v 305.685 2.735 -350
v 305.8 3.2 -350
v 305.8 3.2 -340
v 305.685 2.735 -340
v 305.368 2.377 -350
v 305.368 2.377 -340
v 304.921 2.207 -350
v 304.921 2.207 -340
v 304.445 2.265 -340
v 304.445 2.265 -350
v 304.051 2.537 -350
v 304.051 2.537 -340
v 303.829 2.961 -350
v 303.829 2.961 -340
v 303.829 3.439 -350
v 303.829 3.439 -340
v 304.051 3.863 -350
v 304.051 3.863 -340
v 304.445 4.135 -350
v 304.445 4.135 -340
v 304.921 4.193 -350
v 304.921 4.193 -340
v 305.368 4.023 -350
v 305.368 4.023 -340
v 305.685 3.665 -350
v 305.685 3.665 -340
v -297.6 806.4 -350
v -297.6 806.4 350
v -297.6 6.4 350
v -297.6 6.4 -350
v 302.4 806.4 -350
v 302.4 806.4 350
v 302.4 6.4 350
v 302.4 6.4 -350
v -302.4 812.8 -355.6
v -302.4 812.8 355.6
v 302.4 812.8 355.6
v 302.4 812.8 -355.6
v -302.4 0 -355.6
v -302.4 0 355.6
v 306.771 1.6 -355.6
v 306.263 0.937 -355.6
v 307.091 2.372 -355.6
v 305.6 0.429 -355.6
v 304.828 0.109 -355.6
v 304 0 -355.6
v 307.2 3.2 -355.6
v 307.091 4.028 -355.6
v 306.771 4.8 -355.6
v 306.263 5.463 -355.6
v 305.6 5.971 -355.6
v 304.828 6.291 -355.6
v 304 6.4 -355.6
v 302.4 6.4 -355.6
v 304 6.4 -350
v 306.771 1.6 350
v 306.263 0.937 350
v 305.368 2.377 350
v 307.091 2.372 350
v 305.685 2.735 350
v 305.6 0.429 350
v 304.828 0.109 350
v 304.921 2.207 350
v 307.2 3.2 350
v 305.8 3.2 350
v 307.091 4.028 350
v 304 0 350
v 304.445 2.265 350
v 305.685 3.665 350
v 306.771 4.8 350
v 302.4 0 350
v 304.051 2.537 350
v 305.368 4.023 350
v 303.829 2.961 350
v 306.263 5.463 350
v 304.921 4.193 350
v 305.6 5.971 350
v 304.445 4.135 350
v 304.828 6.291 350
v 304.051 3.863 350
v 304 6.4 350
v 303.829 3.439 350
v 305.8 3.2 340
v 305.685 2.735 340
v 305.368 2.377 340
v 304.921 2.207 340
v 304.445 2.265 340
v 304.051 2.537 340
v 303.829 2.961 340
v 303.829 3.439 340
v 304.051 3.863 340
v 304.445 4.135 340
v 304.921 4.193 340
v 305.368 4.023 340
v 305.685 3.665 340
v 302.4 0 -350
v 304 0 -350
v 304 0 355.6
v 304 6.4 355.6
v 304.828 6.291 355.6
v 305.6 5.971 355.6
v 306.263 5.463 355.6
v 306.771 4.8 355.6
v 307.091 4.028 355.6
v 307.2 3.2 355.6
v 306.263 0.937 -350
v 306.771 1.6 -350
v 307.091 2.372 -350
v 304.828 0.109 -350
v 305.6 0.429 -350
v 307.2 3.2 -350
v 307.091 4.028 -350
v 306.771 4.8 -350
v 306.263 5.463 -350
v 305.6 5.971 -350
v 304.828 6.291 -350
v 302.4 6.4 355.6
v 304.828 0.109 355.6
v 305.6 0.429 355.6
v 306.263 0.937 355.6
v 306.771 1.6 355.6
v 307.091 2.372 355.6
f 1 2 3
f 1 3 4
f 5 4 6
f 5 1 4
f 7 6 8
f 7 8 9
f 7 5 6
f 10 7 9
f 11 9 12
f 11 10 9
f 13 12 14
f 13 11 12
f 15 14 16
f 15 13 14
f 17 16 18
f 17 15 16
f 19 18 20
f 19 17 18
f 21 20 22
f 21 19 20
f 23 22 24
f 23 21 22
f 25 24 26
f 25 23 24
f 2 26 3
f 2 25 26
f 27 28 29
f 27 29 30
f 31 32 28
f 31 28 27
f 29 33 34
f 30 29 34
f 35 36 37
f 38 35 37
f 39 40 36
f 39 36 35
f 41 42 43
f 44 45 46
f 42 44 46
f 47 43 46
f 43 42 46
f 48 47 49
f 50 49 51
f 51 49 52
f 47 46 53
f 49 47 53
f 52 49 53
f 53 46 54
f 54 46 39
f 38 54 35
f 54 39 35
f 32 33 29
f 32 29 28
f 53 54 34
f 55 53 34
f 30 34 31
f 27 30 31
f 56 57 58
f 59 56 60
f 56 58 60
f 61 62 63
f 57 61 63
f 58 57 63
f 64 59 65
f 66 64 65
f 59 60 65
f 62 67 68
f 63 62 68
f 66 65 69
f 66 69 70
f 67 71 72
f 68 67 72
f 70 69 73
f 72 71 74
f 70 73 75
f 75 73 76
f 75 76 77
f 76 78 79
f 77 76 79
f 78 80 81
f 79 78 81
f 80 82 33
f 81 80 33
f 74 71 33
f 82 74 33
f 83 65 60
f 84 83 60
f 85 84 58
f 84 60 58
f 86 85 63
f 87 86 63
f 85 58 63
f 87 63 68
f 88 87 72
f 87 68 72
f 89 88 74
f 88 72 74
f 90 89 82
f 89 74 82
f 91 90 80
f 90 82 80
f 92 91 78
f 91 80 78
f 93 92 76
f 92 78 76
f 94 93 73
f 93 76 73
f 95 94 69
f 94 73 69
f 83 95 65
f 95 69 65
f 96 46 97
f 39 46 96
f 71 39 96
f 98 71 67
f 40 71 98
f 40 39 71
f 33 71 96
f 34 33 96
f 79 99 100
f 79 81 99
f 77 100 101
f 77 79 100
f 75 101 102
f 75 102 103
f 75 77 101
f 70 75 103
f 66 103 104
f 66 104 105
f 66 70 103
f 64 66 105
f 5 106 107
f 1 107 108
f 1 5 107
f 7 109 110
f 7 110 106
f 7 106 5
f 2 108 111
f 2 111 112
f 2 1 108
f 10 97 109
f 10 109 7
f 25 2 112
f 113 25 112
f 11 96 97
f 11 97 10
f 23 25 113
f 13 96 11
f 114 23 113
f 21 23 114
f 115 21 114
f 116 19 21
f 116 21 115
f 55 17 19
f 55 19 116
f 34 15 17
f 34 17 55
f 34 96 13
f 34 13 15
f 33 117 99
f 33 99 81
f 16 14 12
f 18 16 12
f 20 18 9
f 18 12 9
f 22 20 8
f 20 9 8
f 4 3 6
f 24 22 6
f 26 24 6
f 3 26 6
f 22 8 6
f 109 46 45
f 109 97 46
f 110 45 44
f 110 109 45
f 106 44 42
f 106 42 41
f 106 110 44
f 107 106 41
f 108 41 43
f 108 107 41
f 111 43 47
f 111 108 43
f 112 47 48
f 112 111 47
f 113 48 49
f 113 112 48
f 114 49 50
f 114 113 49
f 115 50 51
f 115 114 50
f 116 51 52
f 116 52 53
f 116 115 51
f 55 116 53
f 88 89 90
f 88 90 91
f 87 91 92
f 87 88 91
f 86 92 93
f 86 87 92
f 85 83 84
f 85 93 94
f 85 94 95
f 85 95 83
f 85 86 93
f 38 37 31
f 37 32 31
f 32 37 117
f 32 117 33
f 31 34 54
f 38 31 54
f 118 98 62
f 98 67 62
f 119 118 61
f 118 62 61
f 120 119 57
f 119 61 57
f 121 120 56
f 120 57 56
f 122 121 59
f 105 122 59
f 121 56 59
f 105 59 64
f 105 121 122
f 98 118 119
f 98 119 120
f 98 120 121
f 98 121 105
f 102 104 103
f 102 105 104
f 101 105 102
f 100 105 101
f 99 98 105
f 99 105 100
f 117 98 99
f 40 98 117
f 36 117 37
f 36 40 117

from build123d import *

# Parameters (mm, degrees)
SKETCH1_W            = 604.8
SKETCH1_H            = 711.2
BOSS_EXTRUDE1_DEPTH  = 812.8
SKETCH2_W            = 700
SKETCH2_H            = 800
BOSS_EXTRUDE2_DEPTH  = 600
SKETCH2_2_W          = 700
SKETCH2_2_H          = 800
CUT_EXTRUDE1_DEPTH   = 600
SKETCH3_W            = 5.6
SKETCH3_H            = 6.4
BOSS_EXTRUDE3_DEPTH  = 4.8
FILLET1_R            = 3.2
SKETCH4_R            = 1
BOSS_EXTRUDE4_DEPTH  = 10
FILLET1_OF_MIRROR1_R = 3.2


with BuildPart() as part:
    # Sketch1 → Boss-Extrude1 (new body)
    with BuildSketch(Plane(origin=(0, 0, 0), x_dir=(1, 0, 0), z_dir=(0, 1, 0))):
        Rectangle(SKETCH1_W, SKETCH1_H)
    extrude(amount=BOSS_EXTRUDE1_DEPTH)

    # Sketch2 → Boss-Extrude2 (add)
    with BuildSketch(Plane(origin=(302.4, 0, 0), x_dir=(0, 0, -1), z_dir=(1, 0, 0))):
        with Locations((0, 406.4)):
            Rectangle(SKETCH2_W, SKETCH2_H)
    extrude(amount=-BOSS_EXTRUDE2_DEPTH)

    # Sketch2<2> → Cut-Extrude1 (cut)
    with BuildSketch(Plane(origin=(302.4, 0, 0), x_dir=(0, 0, -1), z_dir=(1, 0, 0))):
        with Locations((0, 406.4)):
            Rectangle(SKETCH2_2_W, SKETCH2_2_H)
    extrude(amount=-CUT_EXTRUDE1_DEPTH, mode=Mode.SUBTRACT)

    # Sketch3 → Boss-Extrude3 (add)
    with BuildSketch(Plane(origin=(302.4, 0, 0), x_dir=(0, 0, -1), z_dir=(1, 0, 0))):
        with Locations((-352.8, 3.2)):
            Rectangle(SKETCH3_W, SKETCH3_H)
    boss_extrude3 = extrude(amount=BOSS_EXTRUDE3_DEPTH)

    # Fillet1
    fillet1_edges = [part.edges().sort_by_distance(p)[0] for p in [
        (307.2, 0, 352.8),
        (307.2, 6.4, 352.8),
    ]]
    fillet(fillet1_edges, radius=FILLET1_R - 0.0001)  # a hair under: the kernel refuses the full size

    # Sketch4 → Boss-Extrude4 (add)
    with BuildSketch(Plane(origin=(0, 0, 350), x_dir=(-1, 0, 0), z_dir=(0, 0, -1))):
        with Locations(Location((-304.8, 3.2, 0), (0, 0, 180))):
            Circle(SKETCH4_R)
    boss_extrude4 = extrude(amount=BOSS_EXTRUDE4_DEPTH)

    # Mirror1: Boss-Extrude3, Boss-Extrude4 across plane
    add(boss_extrude3.mirror(Plane.XY))
    add(boss_extrude4.mirror(Plane.XY))

    # Fillet1 of Mirror1
    fillet1_of_mirror1_edges = [part.edges().sort_by_distance(p)[0] for p in [
        (307.2, 0, -352.8),
        (307.2, 6.4, -352.8),
    ]]
    fillet(fillet1_of_mirror1_edges, radius=FILLET1_OF_MIRROR1_R - 0.0001)  # a hair under: the kernel refuses the full size


solid = part.part
